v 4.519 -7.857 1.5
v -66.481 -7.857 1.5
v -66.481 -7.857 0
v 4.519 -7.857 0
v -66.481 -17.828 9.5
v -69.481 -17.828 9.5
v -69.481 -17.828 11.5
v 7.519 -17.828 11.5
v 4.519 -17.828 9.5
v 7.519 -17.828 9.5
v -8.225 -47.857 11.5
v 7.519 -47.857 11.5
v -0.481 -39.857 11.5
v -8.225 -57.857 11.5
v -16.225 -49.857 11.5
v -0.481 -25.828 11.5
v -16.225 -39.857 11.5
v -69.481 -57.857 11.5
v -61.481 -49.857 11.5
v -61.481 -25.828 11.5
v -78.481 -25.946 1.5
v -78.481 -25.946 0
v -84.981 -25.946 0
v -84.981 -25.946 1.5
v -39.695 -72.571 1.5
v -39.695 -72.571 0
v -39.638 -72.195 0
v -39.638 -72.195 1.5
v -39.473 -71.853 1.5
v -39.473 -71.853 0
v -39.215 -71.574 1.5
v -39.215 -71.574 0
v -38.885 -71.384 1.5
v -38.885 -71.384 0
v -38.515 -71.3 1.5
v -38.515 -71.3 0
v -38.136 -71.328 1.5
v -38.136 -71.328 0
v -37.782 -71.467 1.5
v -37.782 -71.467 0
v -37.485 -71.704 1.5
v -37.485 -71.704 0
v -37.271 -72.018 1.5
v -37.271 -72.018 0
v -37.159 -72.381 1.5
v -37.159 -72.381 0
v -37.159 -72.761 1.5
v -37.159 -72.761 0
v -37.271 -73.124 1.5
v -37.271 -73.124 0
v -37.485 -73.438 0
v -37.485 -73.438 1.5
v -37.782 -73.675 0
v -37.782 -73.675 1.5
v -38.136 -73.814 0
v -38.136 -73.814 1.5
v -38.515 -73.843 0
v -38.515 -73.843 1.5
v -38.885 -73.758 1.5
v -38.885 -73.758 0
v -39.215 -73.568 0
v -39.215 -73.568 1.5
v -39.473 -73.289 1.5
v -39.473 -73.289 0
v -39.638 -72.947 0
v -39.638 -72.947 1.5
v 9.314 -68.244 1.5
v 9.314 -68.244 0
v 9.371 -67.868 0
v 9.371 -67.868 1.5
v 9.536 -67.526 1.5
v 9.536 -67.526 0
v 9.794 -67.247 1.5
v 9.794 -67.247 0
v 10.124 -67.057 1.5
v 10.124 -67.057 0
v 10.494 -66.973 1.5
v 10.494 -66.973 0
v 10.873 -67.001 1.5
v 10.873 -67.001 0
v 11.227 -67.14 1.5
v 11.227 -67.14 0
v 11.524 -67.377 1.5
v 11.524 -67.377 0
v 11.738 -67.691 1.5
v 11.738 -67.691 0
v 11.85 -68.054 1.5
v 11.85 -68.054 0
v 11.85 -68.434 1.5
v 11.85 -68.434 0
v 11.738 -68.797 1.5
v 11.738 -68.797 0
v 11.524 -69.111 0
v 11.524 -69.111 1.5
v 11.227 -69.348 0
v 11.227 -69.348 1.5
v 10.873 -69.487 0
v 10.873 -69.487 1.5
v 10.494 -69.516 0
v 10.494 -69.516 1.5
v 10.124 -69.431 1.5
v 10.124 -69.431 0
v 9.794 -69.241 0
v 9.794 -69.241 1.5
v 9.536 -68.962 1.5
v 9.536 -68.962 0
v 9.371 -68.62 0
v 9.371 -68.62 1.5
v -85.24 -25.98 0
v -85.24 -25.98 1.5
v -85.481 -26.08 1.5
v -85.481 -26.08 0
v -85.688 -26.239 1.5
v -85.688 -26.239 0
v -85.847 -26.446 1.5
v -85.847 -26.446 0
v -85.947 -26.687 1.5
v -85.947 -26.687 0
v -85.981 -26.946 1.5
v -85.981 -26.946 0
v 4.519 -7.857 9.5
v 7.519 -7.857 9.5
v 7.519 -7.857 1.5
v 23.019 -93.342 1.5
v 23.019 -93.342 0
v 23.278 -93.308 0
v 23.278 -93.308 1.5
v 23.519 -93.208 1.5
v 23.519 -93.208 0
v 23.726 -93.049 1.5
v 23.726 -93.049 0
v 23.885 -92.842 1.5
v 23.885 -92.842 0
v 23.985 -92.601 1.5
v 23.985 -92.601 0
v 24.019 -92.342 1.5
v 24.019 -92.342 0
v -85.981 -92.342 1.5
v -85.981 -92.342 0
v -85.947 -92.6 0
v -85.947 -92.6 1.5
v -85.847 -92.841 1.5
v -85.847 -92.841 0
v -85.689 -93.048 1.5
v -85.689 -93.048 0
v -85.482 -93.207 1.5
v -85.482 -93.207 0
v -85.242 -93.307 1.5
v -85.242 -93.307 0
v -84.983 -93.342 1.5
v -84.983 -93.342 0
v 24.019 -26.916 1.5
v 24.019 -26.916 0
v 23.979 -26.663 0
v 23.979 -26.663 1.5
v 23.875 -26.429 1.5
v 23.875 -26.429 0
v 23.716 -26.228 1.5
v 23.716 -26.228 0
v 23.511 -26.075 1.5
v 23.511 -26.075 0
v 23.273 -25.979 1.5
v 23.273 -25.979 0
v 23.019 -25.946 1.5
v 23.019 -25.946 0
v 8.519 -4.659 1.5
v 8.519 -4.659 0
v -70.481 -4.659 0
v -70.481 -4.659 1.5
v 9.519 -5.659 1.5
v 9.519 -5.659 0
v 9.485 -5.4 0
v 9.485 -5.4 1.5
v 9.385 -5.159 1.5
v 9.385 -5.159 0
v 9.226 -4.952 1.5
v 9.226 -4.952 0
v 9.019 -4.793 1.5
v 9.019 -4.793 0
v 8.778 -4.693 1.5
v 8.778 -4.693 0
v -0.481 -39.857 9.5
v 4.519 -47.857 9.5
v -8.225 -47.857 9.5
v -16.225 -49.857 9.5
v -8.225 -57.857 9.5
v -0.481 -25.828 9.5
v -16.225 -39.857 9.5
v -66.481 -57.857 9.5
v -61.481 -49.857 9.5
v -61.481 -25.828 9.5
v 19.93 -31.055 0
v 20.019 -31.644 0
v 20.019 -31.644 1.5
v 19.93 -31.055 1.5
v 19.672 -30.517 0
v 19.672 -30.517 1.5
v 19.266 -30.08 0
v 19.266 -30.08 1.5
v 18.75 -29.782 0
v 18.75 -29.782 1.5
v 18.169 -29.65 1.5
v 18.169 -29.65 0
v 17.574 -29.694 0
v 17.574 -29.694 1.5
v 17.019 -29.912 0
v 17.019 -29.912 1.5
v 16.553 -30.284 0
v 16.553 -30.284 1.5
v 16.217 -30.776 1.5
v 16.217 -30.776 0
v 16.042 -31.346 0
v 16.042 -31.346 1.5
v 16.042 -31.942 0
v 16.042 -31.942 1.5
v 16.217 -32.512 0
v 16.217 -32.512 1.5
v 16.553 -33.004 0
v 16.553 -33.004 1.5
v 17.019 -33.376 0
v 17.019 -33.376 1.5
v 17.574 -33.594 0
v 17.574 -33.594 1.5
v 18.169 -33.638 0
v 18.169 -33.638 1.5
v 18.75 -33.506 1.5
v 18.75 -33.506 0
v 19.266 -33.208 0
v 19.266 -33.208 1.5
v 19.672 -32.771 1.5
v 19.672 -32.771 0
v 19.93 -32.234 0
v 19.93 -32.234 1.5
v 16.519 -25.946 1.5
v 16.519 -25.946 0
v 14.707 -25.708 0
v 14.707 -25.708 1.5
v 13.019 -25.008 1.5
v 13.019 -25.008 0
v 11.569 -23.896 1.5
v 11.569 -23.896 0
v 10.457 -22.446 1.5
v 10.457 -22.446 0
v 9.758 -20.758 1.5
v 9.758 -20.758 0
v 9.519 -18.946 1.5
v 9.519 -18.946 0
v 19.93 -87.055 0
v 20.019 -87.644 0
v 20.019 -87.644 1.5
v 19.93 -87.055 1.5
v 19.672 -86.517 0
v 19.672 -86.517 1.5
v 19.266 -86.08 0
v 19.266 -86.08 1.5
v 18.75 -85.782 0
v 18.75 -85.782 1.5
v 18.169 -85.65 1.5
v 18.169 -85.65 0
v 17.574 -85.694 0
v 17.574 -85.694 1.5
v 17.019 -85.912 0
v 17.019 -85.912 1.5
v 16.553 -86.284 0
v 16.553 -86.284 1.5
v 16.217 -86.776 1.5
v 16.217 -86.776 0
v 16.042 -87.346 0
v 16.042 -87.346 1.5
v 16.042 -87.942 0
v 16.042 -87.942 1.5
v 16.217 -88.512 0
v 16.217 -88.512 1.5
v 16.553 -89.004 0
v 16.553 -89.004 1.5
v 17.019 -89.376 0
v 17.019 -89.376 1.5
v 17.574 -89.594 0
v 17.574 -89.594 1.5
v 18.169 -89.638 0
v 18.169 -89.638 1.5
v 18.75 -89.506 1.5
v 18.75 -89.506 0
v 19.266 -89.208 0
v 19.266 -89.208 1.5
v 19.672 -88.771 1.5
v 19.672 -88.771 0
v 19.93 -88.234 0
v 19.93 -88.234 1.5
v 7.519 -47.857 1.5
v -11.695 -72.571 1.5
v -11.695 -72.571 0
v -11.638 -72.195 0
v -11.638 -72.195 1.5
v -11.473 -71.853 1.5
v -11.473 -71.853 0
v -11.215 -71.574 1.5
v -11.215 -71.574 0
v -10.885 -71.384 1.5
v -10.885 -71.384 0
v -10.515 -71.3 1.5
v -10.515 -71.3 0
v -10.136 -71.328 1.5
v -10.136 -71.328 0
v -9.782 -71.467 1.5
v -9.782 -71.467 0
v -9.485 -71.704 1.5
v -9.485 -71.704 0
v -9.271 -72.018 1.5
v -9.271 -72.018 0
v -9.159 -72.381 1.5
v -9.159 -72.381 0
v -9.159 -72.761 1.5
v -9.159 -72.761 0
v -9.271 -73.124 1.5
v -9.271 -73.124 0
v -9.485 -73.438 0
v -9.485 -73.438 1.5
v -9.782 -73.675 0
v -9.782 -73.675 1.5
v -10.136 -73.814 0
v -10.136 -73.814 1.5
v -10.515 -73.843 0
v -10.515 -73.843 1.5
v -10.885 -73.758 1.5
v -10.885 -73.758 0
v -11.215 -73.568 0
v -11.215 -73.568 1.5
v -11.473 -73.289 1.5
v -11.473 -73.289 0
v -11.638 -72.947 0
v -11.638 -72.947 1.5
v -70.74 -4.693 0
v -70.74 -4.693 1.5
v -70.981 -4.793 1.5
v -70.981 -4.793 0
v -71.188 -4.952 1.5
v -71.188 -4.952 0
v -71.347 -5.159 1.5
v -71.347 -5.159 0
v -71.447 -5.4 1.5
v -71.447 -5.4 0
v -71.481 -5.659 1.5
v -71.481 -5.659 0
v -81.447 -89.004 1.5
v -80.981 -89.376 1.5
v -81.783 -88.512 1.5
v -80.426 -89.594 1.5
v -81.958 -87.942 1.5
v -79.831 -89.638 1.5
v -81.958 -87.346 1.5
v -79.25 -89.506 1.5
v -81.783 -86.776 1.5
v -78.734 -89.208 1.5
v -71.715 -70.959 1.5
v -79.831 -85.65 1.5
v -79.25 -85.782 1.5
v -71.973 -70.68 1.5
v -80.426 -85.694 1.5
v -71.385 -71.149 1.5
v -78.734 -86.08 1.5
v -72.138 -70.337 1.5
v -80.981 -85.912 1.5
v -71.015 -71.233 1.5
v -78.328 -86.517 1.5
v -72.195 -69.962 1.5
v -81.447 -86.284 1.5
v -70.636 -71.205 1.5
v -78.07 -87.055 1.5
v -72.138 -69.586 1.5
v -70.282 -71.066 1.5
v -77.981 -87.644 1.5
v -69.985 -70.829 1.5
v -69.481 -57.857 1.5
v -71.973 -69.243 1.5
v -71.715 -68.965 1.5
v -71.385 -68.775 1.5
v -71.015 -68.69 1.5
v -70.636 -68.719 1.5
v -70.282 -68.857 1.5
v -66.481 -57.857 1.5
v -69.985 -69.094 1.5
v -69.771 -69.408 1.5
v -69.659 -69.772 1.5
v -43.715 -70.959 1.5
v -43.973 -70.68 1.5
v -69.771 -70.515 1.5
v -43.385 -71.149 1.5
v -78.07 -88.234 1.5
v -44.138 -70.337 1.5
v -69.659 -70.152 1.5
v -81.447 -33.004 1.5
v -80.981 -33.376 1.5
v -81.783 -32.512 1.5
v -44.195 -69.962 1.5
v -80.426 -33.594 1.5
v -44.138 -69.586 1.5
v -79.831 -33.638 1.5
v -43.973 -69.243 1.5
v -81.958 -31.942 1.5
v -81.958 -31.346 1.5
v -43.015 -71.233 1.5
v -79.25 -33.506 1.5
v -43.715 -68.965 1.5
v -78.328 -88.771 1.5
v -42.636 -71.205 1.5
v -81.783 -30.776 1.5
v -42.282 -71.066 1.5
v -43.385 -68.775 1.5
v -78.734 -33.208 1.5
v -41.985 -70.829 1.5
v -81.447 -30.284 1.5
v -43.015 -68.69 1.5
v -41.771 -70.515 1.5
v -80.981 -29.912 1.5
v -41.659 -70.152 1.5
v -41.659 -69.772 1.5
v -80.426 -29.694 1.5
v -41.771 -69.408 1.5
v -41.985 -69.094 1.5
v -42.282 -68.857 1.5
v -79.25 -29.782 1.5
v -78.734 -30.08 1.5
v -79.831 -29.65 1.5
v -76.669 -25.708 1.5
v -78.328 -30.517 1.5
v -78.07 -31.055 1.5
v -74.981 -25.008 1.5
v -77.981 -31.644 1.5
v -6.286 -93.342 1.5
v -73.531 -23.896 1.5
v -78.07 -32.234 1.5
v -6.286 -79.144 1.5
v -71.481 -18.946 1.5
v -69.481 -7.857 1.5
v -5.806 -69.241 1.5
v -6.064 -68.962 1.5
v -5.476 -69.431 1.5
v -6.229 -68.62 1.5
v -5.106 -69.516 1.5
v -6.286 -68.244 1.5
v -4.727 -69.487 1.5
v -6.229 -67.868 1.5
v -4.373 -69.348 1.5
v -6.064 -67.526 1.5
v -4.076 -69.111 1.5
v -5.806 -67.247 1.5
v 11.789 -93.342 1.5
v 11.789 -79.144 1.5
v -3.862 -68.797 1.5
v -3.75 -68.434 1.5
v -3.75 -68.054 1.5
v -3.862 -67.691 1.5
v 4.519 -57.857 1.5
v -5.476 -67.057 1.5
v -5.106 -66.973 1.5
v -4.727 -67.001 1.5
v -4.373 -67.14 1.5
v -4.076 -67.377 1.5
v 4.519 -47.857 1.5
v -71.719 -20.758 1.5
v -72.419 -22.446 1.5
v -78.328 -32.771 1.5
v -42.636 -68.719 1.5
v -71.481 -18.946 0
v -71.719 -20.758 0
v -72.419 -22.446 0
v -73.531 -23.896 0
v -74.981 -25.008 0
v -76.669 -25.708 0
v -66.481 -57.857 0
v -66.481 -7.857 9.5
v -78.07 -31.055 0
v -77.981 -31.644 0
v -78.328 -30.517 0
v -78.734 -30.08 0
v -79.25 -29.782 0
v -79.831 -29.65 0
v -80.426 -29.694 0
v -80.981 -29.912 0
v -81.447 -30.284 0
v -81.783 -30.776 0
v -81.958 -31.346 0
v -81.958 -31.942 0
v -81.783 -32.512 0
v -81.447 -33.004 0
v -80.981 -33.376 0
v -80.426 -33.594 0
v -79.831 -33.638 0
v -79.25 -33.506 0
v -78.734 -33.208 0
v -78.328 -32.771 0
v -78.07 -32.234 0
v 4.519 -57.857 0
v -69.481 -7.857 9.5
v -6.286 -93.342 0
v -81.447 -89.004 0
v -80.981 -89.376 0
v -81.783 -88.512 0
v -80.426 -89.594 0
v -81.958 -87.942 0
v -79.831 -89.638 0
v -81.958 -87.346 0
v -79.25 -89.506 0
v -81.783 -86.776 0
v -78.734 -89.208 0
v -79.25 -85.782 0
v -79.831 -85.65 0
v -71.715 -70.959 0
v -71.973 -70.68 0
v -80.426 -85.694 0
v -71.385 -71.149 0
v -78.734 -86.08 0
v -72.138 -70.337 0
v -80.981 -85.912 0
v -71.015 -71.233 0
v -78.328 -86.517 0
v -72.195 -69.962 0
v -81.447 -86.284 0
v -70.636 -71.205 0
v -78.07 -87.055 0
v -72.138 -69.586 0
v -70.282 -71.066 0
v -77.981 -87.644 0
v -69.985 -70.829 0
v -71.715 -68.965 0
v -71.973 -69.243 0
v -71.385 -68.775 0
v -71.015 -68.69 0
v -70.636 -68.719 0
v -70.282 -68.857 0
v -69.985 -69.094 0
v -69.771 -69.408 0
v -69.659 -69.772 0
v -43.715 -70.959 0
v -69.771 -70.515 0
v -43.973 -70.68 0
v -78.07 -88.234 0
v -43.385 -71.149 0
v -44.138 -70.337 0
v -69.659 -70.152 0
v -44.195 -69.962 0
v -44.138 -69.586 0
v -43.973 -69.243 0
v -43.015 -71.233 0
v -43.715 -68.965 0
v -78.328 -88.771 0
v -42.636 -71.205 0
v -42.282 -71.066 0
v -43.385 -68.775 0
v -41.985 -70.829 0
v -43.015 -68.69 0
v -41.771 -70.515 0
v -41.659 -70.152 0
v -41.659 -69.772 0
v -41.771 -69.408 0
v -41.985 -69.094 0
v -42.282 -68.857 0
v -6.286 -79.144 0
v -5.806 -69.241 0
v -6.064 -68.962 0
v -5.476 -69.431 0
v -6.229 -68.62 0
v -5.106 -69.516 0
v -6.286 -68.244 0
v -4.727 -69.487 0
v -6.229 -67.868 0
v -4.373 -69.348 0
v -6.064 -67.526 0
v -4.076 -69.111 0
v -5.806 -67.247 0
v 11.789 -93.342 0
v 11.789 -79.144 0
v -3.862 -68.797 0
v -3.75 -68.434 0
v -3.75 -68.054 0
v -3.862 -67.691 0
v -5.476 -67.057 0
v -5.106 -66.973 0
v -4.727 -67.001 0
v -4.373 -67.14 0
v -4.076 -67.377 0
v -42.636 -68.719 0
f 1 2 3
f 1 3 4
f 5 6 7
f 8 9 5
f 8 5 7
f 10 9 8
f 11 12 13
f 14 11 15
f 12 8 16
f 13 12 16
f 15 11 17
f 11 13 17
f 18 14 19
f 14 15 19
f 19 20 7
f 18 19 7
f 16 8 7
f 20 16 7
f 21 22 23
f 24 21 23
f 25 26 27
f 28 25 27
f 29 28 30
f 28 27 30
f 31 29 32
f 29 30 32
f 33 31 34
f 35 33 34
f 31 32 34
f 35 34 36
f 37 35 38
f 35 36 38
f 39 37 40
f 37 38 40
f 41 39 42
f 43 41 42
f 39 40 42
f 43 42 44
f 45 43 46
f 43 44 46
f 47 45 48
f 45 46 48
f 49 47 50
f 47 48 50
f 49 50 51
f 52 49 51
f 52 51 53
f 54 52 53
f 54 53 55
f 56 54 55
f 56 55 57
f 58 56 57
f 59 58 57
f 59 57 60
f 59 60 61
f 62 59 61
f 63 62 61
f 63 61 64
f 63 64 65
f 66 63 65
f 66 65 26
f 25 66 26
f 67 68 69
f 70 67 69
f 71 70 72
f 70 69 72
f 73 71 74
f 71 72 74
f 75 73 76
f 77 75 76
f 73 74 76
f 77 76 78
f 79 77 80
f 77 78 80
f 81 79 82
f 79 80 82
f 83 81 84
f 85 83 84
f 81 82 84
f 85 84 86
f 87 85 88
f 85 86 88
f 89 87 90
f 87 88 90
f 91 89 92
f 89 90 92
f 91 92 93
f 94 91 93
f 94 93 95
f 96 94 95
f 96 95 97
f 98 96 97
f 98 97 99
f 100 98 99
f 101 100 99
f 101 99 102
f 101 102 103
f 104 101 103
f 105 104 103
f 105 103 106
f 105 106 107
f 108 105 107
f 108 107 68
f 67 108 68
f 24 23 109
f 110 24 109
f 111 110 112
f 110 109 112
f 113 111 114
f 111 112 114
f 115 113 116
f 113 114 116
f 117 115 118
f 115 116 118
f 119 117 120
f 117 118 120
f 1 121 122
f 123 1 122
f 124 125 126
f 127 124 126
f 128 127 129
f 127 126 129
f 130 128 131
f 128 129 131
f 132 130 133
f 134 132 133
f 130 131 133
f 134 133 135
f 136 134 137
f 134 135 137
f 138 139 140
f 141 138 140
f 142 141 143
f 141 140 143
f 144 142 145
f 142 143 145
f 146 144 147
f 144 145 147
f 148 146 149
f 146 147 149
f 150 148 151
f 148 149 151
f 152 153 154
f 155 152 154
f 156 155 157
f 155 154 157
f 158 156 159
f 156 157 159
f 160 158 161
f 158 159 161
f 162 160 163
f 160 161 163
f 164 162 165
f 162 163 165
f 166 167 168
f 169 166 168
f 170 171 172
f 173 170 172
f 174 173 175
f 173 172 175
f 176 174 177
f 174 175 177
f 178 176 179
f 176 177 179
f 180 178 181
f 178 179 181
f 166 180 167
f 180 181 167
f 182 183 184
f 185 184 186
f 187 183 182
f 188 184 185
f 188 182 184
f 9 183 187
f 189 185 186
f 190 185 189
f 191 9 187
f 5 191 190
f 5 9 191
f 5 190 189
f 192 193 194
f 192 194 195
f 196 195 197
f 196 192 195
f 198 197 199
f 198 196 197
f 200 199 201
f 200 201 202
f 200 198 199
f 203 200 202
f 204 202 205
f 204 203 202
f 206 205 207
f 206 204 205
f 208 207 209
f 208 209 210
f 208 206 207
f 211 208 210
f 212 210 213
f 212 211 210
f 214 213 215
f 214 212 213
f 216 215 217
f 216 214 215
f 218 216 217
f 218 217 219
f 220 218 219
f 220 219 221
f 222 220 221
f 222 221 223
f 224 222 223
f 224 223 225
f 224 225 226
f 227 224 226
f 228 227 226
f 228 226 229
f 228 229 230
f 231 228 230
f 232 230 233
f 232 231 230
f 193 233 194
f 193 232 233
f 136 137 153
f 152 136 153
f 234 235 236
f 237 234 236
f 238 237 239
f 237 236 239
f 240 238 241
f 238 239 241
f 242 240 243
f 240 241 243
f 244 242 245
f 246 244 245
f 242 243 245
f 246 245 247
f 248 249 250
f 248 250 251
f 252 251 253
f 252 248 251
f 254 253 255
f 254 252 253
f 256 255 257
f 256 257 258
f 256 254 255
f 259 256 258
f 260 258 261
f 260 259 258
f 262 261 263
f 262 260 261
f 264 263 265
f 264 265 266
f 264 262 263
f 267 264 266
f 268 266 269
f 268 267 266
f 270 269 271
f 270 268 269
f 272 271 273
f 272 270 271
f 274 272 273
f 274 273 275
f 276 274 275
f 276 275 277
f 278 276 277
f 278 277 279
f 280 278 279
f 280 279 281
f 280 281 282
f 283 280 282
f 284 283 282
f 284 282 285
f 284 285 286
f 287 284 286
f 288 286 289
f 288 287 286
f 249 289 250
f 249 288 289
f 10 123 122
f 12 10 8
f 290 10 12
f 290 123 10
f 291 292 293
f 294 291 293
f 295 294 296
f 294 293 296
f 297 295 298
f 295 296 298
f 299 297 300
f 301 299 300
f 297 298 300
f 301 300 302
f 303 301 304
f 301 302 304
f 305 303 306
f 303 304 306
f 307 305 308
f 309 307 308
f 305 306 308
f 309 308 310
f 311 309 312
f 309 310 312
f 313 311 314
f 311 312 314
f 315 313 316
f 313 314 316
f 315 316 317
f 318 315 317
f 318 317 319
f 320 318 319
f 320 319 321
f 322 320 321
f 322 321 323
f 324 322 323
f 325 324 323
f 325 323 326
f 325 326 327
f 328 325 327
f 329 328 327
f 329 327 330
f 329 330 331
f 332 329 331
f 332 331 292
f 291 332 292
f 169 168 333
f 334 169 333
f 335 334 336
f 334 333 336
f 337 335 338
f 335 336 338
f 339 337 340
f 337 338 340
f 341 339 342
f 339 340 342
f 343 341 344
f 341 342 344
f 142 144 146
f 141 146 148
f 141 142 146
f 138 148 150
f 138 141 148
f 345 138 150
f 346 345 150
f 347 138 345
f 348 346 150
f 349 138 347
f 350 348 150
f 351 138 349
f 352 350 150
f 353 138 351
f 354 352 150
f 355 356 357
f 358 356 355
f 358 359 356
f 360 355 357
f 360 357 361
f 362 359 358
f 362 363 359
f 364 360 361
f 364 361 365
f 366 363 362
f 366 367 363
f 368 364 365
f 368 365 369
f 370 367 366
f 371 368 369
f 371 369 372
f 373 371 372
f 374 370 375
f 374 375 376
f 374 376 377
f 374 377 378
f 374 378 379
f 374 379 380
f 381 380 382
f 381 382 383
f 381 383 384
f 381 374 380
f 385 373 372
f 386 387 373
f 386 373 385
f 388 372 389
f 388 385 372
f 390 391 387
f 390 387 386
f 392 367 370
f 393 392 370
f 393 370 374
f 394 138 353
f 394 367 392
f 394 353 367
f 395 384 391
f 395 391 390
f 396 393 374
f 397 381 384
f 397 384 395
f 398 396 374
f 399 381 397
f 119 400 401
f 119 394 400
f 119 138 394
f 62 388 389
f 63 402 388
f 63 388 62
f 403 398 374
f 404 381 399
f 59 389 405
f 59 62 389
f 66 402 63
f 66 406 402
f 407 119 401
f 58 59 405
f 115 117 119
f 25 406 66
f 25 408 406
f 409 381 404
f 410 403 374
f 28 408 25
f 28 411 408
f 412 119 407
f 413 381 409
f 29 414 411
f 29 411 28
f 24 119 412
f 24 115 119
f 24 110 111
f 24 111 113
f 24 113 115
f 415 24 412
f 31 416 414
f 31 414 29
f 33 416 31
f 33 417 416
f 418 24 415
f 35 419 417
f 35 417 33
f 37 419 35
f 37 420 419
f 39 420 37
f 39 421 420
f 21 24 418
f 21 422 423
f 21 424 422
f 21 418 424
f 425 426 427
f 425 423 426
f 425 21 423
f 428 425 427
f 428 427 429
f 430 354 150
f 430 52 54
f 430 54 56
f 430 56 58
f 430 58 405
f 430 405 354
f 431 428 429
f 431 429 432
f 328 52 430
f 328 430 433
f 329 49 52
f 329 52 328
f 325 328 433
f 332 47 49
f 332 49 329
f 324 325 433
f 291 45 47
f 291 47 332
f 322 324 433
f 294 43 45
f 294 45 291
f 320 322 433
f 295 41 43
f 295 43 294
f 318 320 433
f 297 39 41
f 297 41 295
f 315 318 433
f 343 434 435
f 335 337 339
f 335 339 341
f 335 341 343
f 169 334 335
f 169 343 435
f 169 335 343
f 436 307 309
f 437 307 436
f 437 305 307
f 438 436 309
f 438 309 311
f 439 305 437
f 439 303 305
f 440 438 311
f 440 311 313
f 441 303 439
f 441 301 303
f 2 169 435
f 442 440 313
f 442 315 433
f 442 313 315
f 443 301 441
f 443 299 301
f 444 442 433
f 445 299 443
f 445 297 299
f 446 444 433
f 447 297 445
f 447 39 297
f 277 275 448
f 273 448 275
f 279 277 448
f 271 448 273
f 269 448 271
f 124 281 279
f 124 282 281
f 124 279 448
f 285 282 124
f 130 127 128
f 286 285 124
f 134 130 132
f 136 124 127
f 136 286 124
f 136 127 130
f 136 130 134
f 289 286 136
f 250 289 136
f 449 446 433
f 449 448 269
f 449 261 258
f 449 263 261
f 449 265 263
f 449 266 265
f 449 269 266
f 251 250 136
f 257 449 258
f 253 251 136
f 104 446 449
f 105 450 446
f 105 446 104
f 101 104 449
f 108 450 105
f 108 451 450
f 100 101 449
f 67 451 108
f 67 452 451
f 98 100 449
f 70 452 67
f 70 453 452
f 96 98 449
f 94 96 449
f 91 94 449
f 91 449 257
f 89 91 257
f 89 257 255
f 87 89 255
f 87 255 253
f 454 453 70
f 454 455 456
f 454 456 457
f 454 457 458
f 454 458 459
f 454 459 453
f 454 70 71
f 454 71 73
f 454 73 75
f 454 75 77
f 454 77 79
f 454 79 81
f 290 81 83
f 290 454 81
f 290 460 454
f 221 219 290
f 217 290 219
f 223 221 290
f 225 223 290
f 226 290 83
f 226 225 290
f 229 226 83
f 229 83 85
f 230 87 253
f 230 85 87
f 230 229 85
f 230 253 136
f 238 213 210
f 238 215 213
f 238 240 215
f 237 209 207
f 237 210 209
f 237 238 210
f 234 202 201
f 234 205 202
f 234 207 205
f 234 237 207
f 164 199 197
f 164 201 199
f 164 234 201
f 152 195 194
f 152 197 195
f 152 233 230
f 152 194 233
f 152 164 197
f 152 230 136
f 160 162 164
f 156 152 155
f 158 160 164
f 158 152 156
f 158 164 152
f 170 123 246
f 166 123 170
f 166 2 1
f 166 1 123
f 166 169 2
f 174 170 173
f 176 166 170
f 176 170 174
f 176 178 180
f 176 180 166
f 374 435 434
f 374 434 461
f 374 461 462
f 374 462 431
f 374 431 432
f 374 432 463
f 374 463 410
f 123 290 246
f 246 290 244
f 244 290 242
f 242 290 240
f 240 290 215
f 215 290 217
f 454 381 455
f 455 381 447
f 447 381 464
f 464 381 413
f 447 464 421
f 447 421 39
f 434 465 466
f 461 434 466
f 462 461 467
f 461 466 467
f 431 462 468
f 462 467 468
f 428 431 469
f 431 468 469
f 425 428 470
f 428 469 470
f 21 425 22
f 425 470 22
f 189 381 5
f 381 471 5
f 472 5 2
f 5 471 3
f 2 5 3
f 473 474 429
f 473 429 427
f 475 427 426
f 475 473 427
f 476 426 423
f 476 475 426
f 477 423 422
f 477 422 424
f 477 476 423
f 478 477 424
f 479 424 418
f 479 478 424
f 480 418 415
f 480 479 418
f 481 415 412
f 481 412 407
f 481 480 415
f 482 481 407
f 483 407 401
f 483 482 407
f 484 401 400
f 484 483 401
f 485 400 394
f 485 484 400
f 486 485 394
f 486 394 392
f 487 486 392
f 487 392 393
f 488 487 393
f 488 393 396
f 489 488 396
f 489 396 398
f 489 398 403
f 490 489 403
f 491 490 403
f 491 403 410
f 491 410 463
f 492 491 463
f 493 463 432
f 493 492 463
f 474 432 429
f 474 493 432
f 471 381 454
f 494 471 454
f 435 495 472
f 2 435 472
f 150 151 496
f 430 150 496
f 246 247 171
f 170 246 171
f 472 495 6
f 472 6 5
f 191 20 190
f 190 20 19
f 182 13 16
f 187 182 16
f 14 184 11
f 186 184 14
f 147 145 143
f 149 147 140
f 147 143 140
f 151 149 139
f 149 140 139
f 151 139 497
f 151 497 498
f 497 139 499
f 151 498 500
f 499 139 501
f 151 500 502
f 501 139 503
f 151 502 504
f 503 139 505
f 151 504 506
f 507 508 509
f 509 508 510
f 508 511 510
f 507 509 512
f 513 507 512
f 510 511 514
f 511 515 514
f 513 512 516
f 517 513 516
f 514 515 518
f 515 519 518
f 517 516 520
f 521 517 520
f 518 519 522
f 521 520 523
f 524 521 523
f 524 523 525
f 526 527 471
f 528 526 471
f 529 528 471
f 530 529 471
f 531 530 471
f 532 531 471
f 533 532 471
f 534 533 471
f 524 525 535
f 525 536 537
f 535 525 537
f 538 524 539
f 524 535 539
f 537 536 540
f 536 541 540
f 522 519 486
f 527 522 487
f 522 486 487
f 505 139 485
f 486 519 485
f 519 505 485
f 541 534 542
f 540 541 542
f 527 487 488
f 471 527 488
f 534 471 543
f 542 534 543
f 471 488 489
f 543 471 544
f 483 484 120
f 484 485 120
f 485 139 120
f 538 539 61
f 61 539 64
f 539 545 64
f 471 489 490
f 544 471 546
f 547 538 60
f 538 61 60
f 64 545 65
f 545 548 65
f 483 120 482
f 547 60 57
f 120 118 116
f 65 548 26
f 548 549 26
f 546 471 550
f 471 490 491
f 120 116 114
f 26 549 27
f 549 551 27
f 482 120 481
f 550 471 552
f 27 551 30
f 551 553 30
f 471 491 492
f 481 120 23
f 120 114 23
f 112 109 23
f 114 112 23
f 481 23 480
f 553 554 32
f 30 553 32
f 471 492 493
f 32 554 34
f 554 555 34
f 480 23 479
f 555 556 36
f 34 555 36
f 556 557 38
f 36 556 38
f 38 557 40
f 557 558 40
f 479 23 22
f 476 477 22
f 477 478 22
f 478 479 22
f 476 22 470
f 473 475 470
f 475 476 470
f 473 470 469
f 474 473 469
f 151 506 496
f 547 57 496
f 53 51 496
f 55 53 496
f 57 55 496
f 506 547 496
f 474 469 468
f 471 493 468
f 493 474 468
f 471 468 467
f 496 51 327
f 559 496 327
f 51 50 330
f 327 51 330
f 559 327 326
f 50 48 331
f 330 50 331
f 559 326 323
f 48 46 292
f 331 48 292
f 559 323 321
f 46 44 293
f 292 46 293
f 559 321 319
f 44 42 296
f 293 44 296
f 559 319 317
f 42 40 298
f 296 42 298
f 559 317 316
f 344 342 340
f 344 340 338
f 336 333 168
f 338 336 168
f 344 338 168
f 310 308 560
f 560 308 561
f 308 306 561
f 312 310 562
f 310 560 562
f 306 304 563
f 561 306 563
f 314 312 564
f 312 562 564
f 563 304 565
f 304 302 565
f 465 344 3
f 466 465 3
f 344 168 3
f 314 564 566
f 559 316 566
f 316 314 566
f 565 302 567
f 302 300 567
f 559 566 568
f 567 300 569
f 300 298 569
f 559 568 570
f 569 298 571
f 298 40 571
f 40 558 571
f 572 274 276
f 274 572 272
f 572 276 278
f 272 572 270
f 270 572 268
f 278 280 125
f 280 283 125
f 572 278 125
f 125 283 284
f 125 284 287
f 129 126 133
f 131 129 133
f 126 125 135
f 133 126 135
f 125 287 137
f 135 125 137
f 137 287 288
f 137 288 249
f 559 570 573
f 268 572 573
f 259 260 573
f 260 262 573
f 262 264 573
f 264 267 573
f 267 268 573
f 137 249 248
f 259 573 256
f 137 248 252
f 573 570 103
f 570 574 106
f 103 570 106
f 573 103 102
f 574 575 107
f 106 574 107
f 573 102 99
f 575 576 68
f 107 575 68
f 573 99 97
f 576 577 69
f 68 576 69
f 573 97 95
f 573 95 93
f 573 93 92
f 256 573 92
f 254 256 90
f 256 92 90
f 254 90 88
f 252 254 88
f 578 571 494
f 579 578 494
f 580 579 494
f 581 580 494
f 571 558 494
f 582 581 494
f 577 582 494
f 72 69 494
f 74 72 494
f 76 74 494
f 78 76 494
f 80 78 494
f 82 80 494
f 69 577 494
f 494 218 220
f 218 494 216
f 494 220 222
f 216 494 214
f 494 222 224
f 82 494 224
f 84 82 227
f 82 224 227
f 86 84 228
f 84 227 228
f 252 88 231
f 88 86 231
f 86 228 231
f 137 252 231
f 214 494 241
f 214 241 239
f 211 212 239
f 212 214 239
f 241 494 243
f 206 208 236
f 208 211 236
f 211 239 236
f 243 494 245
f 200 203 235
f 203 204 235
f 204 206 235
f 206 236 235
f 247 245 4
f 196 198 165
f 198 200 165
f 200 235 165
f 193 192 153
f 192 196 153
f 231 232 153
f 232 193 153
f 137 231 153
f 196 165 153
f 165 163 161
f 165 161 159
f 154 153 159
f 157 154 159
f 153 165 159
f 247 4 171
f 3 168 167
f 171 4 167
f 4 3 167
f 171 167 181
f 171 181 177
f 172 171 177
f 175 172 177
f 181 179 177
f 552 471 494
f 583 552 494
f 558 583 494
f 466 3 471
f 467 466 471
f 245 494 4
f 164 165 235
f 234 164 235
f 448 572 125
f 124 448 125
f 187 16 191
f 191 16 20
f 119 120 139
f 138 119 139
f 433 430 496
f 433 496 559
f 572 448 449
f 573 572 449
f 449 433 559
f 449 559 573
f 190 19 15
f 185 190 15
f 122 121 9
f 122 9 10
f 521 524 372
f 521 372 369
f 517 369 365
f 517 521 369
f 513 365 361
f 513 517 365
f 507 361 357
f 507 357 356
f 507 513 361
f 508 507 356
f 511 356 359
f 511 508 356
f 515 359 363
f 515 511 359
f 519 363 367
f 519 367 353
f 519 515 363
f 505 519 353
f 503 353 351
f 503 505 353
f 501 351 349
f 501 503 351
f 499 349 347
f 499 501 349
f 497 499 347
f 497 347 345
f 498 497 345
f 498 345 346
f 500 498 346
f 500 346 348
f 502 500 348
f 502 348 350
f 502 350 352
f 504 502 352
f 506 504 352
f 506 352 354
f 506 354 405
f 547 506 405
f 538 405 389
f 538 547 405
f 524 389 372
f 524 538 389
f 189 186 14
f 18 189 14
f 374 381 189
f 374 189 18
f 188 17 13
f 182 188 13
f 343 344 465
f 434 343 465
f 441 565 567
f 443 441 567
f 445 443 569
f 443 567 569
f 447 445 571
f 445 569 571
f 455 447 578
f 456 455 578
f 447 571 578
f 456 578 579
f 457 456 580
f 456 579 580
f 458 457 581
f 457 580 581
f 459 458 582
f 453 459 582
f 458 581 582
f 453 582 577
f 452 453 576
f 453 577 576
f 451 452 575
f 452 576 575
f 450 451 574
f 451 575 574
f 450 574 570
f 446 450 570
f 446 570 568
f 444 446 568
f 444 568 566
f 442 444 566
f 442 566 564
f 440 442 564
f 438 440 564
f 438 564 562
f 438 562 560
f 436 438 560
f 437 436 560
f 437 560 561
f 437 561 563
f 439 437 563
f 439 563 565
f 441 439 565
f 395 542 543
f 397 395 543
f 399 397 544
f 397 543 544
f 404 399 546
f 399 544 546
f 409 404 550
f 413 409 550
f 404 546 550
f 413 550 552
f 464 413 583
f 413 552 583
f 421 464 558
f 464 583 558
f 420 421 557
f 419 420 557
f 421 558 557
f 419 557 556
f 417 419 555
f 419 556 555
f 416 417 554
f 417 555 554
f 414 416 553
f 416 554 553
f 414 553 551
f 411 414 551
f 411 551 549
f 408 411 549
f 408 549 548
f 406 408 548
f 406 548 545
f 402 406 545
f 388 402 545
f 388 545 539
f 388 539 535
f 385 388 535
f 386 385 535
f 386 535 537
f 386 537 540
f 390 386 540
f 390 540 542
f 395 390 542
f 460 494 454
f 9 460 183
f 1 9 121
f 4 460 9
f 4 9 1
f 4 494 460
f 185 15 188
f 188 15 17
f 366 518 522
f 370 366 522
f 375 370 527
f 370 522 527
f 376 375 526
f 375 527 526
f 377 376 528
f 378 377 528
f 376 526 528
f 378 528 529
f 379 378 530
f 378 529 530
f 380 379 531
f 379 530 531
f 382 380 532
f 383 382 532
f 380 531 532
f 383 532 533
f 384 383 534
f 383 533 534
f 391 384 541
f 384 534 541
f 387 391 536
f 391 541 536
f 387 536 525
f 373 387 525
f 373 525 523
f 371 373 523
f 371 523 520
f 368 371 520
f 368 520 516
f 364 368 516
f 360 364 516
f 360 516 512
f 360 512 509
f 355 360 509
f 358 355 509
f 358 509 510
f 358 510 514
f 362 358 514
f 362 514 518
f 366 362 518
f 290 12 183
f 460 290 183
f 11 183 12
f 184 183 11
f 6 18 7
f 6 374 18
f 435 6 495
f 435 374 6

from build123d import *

# Parameters (mm, degrees)
SKETCH_1_R           = 2
EXTRUDE_1_DEPTH      = 1.5
SKETCH_2_W           = 3
SKETCH_2_H           = 50
SKETCH_2_H_2         = 40
EXTRUDE_3_DEPTH      = 8
EXTRUDE_4_DEPTH      = 2
SKETCH_4_W           = 71.000000198
SKETCH_4_H           = 50
CUT_EXTRUDE_1_DEPTH  = 128.300477144
CUT_EXTRUDE_3_DEPTH  = 128.427082997
HOLE_WIZARD_M2_5_1_D = 2.55
SKETCH_11_W          = 18.075
SKETCH_11_H          = 14.197672296
CUT_EXTRUDE_4_DEPTH  = 128.300477144


with BuildPart() as part:
    # 草圖1 → 填料-伸長1 (new body)
    with BuildSketch(Plane.XY):
        with BuildLine():
            Line((-78.58357781, -93.341907955), (16.519190028, -93.341907955))
            Line((16.519190028, -93.341907955), (23.019189929, -93.341907955))
            ThreePointArc((23.019189929, -93.341907955), (23.72629671, -93.049014736), (24.019189929, -92.341907955))
            Line((24.019189929, -92.341907955), (24.019189929, -26.916101175))
            ThreePointArc((24.019189929, -26.916101175), (23.715868617, -26.228364762), (23.019189929, -25.946187519))
            Line((23.019189929, -25.946187519), (16.519190028, -25.946187519))
            ThreePointArc((16.519190028, -25.946187519), (11.569442559, -23.895934988), (9.519190028, -18.946187519))
            Line((9.519190028, -18.946187519), (9.519190028, -5.659090909))
            ThreePointArc((9.519190028, -5.659090909), (9.226296809, -4.951984128), (8.519190028, -4.659090909))
            Line((8.519190028, -4.659090909), (-70.48081017, -4.659090909))
            ThreePointArc((-70.48081017, -4.659090909), (-71.187916951, -4.951984128), (-71.48081017, -5.659090909))
            Line((-71.48081017, -5.659090909), (-71.48081017, -18.946187519))
            ThreePointArc((-71.48081017, -18.946187519), (-73.531062702, -23.895934988), (-78.48081017, -25.946187519))
            Line((-78.48081017, -25.946187519), (-84.980810071, -25.946187519))
            ThreePointArc((-84.980810071, -25.946187519), (-85.687916853, -26.239080738), (-85.980810071, -26.946187519))
            Line((-85.980810071, -26.946187519), (-85.980810071, -92.341911374))
            ThreePointArc((-85.980810071, -92.341911374), (-85.688840793, -93.048093006), (-84.983425077, -93.341907955))
            Line((-84.983425077, -93.341907955), (-78.58357781, -93.341907955))
        make_face()
        with Locations((-79.980810071, -31.644049447)):
            Circle(SKETCH_1_R, mode=Mode.SUBTRACT)
        with Locations((18.019189929, -31.644049447)):
            Circle(SKETCH_1_R, mode=Mode.SUBTRACT)
        with Locations((18.019189929, -87.644049447)):
            Circle(SKETCH_1_R, mode=Mode.SUBTRACT)
        with Locations((-79.980810071, -87.644049447)):
            Circle(SKETCH_1_R, mode=Mode.SUBTRACT)
    extrude(amount=EXTRUDE_1_DEPTH)

    # 草圖2 → 填料-伸長3 (add)
    with BuildSketch(Plane.XY.offset(1.5)):
        with Locations((-67.98081017, -32.85713984)):
            Rectangle(SKETCH_2_W, SKETCH_2_H)
        with Locations((6.019190028, -27.85713984)):
            Rectangle(SKETCH_2_W, SKETCH_2_H_2)
    extrude(amount=EXTRUDE_3_DEPTH)

    # 草圖3 → 填料-伸長4 (add)
    with BuildSketch(Plane.XY.offset(9.5)):
        Polygon((-69.48081017, -17.828011501), (7.519190028, -17.828011501), (7.519190028, -47.85713984), (-8.225095928, -47.85713984), (-8.225095928, -57.85713984), (-69.48081017, -57.85713984), align=None)
    extrude(amount=EXTRUDE_4_DEPTH)

    # 草圖4 → 除料-伸長1 (cut, through all)
    with BuildSketch(Plane.XY.offset(1.5)):
        with Locations((-30.980810071, -32.85713984)):
            Rectangle(SKETCH_4_W, SKETCH_4_H)
    extrude(amount=-CUT_EXTRUDE_1_DEPTH, mode=Mode.SUBTRACT)

    # 草圖7 → 除料-伸長3 (cut, through all)
    with BuildSketch(Plane.XY.offset(11.5)):
        Polygon((-16.225095928, -49.85713984), (-16.225095928, -39.85713984), (-0.480809972, -39.85713984), (-0.480809972, -25.828011501), (-61.48081017, -25.828011501), (-61.48081017, -49.85713984), align=None)
    extrude(amount=-CUT_EXTRUDE_3_DEPTH, mode=Mode.SUBTRACT)

    # M2.5 螺旋的螺孔鑽1 (through all)
    with Locations(Plane.XY.offset(1.5)):
        with Locations((10.589404461, -68.244235659), (-5.010595539, -68.244235659), (-10.419668394, -72.571170345), (-38.419668394, -72.571170345), (-42.919668394, -69.961668418), (-70.919668394, -69.961668418)):
            Hole(HOLE_WIZARD_M2_5_1_D / 2)

    # 草圖11 → 除料-伸長4 (cut, through all)
    with BuildSketch(Plane.XY.offset(1.5)):
        with Locations((2.751904461, -86.243071807)):
            Rectangle(SKETCH_11_W, SKETCH_11_H)
    extrude(amount=-CUT_EXTRUDE_4_DEPTH, mode=Mode.SUBTRACT)


solid = part.part
